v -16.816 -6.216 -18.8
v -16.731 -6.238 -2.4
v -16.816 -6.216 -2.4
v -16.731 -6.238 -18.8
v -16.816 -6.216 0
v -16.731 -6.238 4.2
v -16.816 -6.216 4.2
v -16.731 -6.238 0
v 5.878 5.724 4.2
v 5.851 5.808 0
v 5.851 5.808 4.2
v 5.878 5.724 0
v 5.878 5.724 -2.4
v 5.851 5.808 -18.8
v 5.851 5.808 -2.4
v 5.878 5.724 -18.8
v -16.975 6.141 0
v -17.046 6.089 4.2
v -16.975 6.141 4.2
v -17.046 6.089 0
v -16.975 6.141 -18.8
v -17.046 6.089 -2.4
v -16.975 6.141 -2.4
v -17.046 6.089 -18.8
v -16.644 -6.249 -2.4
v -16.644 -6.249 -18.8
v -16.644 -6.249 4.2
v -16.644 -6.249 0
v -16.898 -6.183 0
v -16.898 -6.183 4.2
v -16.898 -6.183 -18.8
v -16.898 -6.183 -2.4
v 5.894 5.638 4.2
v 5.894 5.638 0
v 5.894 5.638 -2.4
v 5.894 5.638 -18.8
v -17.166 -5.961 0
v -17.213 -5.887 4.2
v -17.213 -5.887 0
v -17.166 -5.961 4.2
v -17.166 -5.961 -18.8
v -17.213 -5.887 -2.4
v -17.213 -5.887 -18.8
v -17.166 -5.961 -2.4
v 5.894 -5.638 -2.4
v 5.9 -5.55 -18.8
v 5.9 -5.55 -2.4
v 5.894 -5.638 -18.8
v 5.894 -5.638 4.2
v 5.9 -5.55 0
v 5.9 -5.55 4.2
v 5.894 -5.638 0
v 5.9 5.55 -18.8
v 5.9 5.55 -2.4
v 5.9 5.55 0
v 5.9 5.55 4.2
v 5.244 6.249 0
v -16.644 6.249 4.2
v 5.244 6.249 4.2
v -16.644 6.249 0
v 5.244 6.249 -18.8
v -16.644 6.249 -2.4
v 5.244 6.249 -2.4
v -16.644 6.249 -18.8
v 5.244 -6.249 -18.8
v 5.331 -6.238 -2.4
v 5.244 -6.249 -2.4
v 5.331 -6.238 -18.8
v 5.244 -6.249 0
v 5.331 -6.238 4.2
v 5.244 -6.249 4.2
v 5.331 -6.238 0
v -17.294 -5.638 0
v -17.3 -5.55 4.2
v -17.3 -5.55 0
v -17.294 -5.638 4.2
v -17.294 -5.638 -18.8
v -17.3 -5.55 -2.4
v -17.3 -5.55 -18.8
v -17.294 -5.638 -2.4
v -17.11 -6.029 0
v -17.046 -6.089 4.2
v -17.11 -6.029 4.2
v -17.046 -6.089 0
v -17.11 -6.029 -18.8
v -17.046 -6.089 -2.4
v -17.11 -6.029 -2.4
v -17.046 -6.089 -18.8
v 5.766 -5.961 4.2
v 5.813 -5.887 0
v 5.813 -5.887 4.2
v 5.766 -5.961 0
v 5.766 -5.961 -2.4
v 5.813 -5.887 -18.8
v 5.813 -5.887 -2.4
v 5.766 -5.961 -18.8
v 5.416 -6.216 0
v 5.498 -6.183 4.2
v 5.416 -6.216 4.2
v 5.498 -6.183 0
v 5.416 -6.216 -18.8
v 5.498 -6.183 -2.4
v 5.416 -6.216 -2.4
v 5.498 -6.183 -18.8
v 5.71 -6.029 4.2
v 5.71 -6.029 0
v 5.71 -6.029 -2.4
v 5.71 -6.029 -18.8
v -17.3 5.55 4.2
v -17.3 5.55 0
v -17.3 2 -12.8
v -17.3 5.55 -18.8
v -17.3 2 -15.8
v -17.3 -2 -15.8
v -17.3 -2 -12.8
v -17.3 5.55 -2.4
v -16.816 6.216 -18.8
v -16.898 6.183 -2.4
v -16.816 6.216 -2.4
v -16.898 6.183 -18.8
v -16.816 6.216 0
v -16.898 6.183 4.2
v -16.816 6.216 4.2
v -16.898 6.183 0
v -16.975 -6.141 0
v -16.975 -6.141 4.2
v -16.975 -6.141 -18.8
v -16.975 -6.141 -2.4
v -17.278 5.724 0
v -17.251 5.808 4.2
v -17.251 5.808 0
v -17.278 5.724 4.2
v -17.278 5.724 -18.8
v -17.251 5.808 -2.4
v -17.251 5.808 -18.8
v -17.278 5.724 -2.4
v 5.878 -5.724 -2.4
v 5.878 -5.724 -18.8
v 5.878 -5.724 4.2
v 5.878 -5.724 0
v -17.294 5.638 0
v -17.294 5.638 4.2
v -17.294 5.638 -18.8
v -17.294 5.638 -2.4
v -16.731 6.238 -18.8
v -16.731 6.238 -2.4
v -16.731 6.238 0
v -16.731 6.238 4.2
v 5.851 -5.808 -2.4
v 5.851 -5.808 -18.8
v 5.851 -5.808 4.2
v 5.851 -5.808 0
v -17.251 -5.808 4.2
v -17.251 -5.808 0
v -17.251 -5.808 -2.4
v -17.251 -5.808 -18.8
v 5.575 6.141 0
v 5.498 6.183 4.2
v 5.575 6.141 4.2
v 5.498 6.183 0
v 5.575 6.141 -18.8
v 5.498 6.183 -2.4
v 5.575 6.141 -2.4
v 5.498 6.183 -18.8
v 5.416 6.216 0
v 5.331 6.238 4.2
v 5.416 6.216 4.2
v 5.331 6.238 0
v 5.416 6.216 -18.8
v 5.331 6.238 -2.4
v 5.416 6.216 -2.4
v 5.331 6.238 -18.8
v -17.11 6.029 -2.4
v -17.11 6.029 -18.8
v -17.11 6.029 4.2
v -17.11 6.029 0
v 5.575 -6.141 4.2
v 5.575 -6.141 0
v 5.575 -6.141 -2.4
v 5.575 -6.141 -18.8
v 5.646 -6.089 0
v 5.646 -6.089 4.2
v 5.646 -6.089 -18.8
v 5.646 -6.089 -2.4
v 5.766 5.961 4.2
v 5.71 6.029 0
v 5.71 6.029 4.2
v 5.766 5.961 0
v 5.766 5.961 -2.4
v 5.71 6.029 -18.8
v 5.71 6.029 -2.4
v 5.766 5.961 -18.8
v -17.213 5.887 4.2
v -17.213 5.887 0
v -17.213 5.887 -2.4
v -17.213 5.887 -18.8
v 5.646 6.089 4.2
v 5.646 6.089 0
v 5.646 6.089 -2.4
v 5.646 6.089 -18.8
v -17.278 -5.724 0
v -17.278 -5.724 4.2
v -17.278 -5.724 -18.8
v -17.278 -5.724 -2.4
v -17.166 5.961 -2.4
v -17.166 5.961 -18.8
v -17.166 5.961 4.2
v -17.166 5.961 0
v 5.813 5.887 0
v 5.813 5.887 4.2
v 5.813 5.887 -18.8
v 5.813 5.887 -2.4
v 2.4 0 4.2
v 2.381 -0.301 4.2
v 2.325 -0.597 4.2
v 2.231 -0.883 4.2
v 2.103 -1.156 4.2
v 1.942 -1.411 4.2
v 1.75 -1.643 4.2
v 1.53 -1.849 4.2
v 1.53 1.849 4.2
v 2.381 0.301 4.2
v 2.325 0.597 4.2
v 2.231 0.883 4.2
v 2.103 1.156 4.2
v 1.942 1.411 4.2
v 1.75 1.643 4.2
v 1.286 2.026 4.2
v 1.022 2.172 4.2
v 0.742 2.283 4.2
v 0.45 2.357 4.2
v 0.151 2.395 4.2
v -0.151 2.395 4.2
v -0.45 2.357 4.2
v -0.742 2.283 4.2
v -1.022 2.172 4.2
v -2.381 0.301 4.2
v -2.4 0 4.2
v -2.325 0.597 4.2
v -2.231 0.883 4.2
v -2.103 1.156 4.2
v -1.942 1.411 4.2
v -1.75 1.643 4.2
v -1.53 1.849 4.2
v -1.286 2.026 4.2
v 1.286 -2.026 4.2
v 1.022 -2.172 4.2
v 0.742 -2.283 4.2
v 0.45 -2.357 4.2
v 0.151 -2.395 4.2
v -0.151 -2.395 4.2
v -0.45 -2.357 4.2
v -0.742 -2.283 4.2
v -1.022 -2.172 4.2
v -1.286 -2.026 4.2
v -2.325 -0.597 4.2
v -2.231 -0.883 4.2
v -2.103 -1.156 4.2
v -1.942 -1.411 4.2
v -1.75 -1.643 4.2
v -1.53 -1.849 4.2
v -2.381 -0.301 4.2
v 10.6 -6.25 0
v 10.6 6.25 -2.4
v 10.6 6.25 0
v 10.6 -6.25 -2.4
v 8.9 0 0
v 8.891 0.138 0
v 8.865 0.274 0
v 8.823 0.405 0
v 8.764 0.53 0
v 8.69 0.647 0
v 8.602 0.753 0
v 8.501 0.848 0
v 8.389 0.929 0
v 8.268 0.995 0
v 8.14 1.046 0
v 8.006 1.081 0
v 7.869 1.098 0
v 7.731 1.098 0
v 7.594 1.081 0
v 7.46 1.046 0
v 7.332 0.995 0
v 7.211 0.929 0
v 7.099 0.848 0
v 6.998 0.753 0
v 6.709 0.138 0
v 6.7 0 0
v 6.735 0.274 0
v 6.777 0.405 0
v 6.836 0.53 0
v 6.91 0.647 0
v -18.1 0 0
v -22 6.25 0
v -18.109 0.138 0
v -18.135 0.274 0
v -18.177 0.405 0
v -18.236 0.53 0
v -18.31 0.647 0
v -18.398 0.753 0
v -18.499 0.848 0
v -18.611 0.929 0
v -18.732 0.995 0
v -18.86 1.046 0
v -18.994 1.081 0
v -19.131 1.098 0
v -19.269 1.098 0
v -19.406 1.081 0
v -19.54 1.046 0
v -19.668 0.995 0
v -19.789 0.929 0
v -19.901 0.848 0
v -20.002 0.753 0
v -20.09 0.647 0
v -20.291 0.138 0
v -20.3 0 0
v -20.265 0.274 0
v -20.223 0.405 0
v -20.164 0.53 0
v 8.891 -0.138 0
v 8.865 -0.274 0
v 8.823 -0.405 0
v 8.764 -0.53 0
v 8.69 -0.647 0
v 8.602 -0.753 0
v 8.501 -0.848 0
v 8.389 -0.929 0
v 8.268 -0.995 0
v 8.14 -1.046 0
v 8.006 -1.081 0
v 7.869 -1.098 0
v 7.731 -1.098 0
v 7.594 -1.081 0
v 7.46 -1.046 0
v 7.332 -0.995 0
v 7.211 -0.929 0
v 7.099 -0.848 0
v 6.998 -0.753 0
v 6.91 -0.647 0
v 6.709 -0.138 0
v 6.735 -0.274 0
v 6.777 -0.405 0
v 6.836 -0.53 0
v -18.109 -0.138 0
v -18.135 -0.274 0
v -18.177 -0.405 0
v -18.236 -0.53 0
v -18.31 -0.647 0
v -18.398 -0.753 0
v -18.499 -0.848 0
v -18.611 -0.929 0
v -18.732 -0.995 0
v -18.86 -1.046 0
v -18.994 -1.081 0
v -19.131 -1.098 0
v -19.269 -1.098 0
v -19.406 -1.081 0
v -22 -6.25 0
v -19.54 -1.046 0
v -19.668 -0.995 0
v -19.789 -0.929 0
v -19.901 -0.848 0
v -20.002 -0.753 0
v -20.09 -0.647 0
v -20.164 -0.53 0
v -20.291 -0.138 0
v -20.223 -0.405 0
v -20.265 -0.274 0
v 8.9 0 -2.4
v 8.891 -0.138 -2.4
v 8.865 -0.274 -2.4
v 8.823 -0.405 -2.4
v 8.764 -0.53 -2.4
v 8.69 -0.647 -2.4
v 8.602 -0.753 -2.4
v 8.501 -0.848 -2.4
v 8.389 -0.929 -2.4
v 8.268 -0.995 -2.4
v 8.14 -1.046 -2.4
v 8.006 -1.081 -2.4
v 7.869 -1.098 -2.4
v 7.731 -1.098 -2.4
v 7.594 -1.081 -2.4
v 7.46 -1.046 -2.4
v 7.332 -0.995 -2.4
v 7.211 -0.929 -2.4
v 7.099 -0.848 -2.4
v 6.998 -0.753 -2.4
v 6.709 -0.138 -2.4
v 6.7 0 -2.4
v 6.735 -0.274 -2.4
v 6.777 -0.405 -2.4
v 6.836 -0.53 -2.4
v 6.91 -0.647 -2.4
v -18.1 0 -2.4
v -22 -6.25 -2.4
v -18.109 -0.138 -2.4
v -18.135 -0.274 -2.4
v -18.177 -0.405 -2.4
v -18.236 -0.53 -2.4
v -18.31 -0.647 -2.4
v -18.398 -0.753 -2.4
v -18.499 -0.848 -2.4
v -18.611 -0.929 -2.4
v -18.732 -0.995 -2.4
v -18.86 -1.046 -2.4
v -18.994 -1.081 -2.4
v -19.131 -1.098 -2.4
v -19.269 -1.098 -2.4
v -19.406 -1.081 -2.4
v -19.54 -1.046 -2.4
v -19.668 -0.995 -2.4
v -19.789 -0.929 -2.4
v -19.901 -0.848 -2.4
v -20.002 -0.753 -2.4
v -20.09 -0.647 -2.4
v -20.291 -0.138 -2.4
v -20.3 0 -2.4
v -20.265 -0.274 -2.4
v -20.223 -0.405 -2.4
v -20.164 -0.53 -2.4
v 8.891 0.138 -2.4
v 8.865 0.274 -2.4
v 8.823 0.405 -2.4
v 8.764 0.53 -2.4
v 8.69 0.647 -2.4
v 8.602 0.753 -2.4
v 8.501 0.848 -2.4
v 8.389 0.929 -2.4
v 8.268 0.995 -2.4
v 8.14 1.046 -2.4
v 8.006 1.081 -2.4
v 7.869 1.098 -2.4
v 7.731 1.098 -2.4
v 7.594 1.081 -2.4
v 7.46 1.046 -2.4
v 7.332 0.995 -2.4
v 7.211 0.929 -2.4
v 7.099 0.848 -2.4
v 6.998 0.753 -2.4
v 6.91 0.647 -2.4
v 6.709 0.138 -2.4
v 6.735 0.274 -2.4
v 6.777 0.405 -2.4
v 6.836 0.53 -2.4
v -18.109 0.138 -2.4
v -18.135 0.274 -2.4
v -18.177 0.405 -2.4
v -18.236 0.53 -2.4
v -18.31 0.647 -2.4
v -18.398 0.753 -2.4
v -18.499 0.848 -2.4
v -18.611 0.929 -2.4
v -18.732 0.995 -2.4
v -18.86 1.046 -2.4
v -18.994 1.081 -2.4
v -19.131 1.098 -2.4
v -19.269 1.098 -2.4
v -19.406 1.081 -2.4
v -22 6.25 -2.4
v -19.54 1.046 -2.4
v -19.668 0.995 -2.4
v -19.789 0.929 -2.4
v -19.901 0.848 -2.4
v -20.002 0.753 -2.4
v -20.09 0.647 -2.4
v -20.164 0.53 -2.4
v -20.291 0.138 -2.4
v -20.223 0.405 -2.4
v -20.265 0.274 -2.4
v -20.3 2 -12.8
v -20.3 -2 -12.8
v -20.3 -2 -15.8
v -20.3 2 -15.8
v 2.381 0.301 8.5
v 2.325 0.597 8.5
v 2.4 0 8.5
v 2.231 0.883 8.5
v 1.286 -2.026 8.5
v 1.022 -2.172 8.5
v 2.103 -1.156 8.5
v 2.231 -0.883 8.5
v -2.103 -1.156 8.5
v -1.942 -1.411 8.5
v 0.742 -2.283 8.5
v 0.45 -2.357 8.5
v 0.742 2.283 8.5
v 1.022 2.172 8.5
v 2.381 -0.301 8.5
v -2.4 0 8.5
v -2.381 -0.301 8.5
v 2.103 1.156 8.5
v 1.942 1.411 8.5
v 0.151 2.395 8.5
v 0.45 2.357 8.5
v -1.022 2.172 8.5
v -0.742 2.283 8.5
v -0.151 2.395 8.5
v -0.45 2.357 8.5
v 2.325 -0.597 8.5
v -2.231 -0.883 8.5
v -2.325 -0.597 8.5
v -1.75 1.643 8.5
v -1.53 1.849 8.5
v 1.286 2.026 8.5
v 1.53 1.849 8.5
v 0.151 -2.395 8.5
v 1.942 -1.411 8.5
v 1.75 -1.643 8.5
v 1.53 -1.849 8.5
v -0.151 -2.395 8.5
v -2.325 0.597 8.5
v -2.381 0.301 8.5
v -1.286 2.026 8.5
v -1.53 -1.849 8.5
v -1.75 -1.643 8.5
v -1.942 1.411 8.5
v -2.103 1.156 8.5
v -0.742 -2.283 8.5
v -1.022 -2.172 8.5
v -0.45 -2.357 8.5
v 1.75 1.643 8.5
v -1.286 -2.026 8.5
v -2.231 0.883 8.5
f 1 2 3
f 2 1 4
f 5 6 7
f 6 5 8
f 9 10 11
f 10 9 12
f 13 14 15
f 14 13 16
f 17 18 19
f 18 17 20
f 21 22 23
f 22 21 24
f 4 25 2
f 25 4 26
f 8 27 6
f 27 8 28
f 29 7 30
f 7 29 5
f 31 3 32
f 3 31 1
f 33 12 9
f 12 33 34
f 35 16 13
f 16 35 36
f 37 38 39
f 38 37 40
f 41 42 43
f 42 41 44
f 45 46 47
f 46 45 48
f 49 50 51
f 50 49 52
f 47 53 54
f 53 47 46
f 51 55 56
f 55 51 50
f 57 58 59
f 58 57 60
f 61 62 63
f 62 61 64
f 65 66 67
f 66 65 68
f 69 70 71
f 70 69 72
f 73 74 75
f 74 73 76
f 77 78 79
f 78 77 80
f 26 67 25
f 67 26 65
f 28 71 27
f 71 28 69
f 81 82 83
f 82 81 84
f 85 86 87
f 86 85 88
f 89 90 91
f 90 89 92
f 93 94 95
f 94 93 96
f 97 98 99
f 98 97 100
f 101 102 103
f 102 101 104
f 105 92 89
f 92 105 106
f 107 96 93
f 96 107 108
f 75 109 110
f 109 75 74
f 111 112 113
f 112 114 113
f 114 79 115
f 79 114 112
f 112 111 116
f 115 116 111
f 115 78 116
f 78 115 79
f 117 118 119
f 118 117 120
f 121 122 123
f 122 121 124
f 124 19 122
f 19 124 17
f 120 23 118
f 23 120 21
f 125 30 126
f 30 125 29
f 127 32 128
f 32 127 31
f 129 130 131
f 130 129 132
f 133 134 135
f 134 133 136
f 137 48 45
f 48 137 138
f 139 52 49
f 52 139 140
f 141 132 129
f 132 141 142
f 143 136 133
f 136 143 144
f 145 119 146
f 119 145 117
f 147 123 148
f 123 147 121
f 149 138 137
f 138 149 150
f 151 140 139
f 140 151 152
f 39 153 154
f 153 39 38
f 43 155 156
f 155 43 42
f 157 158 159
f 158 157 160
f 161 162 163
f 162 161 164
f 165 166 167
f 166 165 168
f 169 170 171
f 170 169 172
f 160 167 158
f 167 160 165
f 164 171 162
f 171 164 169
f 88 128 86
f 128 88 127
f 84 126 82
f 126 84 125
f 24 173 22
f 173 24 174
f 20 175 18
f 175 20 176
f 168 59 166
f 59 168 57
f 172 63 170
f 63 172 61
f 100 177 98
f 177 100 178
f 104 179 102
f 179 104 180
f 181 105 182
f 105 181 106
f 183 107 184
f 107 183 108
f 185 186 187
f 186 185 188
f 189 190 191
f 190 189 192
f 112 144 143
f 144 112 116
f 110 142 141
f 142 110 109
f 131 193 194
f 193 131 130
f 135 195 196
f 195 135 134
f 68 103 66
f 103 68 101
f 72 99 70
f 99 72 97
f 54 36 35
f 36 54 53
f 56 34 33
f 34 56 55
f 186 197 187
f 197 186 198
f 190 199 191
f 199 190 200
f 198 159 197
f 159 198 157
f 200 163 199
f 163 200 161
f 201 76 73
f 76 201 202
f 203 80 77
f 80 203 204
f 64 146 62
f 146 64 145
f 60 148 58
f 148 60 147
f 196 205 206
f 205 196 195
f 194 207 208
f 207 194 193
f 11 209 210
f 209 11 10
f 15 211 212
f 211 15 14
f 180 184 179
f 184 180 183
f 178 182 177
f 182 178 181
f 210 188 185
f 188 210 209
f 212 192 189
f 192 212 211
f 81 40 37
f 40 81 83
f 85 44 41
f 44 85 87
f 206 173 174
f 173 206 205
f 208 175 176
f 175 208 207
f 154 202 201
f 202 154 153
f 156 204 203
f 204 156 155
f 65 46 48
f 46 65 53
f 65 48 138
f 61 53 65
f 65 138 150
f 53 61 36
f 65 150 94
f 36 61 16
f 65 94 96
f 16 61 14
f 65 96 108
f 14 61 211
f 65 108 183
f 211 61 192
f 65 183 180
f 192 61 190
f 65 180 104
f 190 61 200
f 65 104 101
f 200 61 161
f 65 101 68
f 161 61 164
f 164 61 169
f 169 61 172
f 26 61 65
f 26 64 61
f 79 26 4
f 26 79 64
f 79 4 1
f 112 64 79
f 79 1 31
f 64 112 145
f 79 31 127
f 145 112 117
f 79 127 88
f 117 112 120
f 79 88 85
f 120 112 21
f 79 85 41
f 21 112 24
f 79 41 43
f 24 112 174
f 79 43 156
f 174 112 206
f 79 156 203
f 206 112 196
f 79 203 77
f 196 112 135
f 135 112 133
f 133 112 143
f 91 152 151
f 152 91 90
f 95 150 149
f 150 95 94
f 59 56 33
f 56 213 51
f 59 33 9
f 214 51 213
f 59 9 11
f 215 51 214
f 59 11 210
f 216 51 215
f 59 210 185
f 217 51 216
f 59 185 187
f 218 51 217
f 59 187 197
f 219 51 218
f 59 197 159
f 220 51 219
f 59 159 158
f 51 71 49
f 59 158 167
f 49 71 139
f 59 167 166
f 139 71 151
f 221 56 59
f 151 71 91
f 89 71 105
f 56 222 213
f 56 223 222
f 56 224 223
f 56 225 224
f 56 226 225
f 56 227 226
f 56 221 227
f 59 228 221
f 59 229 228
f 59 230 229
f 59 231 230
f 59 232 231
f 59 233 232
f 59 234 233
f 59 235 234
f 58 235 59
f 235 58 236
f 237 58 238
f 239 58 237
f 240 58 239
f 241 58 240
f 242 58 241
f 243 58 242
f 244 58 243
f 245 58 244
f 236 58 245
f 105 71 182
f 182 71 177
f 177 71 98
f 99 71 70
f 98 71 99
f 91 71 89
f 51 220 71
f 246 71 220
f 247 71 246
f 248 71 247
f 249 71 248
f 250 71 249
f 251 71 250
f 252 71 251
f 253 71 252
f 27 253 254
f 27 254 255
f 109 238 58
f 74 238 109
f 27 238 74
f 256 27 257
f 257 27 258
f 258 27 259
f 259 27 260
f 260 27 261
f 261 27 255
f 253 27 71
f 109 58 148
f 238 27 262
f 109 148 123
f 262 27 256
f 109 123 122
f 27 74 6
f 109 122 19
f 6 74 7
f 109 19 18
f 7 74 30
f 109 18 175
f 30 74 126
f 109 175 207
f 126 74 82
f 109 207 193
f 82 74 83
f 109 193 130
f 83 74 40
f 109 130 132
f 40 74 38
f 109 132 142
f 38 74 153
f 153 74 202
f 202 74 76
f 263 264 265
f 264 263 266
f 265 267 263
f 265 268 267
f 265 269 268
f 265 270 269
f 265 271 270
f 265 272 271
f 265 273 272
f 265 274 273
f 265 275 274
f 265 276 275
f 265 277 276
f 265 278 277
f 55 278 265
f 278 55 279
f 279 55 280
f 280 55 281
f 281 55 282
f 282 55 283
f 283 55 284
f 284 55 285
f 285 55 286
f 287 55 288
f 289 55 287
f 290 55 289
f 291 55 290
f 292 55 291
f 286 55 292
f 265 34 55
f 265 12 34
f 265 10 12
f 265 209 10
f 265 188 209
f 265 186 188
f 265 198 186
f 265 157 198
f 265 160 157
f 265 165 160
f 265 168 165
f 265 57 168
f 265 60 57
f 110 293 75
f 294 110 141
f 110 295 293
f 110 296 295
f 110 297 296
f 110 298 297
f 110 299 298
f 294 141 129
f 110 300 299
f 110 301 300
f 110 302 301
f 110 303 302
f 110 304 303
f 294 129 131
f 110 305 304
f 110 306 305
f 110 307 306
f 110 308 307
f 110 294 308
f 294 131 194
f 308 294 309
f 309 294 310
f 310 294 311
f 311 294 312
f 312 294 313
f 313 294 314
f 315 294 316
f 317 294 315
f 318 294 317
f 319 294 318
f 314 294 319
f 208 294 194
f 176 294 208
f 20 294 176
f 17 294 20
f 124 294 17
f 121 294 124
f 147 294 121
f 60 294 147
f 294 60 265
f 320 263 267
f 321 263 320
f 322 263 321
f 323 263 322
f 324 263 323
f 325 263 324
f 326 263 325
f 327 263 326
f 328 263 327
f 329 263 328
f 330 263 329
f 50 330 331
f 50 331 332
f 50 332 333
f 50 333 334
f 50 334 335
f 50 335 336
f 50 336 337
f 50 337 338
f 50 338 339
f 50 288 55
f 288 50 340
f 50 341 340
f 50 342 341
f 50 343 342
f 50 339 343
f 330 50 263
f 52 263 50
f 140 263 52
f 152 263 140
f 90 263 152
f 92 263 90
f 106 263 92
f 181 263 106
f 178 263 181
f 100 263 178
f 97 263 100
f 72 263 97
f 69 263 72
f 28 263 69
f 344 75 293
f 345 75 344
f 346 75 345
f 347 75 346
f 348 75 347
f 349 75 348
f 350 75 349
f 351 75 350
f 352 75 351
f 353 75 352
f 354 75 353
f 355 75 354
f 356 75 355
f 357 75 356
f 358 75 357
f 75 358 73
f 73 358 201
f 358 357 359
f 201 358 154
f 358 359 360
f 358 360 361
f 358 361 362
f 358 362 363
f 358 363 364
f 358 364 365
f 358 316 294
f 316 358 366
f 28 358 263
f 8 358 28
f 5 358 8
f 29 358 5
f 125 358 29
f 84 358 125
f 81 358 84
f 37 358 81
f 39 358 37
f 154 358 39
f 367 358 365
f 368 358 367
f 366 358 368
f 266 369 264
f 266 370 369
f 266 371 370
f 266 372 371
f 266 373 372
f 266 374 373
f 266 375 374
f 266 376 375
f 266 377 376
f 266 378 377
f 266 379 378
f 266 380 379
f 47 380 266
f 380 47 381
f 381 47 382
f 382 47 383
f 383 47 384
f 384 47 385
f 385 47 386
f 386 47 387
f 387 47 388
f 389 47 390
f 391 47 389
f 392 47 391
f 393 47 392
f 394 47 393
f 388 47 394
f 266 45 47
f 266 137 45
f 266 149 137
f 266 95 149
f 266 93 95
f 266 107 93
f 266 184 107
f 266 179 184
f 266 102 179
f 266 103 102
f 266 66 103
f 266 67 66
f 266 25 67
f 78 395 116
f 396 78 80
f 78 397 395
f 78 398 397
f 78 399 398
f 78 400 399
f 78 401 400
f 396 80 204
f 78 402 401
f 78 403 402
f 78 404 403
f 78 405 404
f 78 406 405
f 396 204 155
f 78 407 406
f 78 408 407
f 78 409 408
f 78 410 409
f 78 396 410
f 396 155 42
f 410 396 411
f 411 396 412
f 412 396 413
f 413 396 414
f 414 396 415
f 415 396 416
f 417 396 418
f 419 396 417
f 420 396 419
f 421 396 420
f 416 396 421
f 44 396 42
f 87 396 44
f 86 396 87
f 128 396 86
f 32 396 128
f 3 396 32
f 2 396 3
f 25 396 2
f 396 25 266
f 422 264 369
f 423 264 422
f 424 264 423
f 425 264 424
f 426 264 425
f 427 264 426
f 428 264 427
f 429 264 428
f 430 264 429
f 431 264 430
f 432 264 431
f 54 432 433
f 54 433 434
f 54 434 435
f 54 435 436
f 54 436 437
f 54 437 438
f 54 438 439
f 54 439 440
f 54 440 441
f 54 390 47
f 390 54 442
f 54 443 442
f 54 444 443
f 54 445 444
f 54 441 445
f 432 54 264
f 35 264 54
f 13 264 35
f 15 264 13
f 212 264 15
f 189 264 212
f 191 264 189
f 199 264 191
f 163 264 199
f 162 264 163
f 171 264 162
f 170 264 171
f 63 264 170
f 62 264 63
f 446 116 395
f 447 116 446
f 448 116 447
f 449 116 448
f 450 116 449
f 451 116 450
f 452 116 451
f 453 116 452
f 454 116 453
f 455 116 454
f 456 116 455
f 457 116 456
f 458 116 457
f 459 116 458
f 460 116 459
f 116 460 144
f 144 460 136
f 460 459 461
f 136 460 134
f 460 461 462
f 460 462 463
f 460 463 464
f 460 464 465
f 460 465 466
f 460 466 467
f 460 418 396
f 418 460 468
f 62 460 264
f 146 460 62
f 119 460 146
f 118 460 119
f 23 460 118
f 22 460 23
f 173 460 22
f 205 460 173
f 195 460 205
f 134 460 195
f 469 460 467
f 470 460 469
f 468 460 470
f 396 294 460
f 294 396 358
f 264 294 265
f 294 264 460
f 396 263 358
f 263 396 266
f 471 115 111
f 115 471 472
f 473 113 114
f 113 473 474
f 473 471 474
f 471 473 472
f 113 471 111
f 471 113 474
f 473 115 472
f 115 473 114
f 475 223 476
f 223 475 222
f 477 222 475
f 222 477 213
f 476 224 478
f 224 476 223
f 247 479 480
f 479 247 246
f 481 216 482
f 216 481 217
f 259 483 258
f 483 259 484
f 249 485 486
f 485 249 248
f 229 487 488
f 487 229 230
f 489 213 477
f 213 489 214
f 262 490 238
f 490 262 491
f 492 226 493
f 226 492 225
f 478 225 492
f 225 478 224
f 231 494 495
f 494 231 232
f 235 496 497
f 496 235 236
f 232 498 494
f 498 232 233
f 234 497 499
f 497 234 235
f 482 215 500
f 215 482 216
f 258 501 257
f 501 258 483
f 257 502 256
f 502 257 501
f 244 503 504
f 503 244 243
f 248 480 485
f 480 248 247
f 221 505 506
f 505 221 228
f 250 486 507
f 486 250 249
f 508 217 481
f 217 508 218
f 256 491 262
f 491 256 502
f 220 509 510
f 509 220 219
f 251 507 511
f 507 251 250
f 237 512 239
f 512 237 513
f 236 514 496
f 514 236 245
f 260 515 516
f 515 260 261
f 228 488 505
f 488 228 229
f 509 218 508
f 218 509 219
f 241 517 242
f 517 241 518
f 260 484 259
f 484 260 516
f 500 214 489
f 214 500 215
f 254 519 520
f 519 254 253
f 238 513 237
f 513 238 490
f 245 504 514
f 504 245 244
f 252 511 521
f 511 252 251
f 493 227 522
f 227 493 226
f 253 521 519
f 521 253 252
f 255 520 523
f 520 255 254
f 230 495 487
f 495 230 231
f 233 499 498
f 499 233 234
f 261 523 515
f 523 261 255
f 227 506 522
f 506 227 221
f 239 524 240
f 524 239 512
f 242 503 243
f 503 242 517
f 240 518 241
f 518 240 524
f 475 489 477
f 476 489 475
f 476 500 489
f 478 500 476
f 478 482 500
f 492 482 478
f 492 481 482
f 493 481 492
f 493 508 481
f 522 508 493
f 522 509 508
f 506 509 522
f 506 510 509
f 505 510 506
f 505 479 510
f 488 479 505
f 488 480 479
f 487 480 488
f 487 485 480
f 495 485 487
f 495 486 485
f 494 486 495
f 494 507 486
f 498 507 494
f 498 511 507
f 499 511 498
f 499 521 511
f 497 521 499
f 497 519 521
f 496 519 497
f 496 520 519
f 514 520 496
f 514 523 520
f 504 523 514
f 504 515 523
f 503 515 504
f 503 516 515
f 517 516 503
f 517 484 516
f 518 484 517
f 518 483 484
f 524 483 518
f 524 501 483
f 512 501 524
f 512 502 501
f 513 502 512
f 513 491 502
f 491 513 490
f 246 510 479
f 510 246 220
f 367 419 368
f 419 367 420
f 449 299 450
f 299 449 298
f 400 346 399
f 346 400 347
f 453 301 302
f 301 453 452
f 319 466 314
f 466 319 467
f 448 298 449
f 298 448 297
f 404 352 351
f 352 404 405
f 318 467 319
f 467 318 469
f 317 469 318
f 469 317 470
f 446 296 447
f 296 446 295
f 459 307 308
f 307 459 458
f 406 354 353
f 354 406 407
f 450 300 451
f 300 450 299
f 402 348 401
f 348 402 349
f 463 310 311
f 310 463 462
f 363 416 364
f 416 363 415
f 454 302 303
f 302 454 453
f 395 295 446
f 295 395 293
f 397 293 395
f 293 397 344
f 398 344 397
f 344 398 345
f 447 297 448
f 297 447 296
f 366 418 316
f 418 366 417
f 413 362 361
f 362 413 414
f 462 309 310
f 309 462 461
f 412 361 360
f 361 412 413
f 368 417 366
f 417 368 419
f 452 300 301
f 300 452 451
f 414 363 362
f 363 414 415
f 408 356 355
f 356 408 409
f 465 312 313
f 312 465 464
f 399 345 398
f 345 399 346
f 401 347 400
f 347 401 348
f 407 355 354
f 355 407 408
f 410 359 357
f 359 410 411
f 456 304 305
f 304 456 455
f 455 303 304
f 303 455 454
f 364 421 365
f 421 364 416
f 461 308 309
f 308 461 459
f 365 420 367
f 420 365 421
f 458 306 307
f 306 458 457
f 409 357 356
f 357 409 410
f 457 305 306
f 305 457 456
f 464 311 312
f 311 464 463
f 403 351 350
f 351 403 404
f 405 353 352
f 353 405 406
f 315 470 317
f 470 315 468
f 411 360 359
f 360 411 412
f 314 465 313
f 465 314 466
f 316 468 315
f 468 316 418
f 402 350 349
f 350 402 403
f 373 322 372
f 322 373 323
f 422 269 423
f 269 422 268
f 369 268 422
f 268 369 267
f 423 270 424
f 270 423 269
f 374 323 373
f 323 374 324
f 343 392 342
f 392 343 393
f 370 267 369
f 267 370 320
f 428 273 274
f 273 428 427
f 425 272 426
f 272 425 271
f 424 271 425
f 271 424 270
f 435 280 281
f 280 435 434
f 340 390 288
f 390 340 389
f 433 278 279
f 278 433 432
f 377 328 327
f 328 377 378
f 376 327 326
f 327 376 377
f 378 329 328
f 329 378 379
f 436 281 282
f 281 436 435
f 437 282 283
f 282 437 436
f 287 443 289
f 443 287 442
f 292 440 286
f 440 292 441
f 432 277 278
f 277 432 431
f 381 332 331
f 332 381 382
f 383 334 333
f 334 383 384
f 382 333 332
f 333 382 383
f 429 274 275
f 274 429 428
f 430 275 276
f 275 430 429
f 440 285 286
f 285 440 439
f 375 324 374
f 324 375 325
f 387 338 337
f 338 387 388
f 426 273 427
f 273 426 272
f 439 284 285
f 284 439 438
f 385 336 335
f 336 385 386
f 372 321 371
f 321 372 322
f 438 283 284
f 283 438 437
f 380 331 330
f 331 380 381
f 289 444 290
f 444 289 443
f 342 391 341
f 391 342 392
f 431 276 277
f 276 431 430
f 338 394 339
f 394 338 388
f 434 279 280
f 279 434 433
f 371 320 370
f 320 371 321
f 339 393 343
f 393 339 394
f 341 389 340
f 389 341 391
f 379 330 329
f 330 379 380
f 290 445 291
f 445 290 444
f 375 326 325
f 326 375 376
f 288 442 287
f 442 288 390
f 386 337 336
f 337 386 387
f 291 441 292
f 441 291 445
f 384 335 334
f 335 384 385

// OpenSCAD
$fn = 50;

difference() {
	union() {
		translate(v = [-5.699999999999999, 0, -18.8]) {
			hull() {
				translate(v = [-10.9, 5.55, 0]) {
					cylinder(h = 23, r = 0.7);
				}
				translate(v = [10.9, 5.55, 0]) {
					cylinder(h = 23, r = 0.7);
				}
				translate(v = [-10.9, -5.55, 0]) {
					cylinder(h = 23, r = 0.7);
				}
				translate(v = [10.9, -5.55, 0]) {
					cylinder(h = 23, r = 0.7);
				}
			}
		}
		translate(v = [-22.0, -6.25, -2.4]) {
			cube(size = [32.6, 12.5, 2.4]);
		}
		translate(v = [-20.299999999999997, -2.0, -15.8]) {
			cube(size = [4, 4, 3]);
		}
		translate(v = [0, 0, 4.2]) {
			cylinder(h = 4.3, r = 2.4);
		}
	}
	union() {
		translate(v = [-19.2, 0, -4]) {
			cylinder(h = 5, r = 1.1);
		}
		translate(v = [7.8, 0, -4]) {
			cylinder(h = 5, r = 1.1);
		}
	}
}
